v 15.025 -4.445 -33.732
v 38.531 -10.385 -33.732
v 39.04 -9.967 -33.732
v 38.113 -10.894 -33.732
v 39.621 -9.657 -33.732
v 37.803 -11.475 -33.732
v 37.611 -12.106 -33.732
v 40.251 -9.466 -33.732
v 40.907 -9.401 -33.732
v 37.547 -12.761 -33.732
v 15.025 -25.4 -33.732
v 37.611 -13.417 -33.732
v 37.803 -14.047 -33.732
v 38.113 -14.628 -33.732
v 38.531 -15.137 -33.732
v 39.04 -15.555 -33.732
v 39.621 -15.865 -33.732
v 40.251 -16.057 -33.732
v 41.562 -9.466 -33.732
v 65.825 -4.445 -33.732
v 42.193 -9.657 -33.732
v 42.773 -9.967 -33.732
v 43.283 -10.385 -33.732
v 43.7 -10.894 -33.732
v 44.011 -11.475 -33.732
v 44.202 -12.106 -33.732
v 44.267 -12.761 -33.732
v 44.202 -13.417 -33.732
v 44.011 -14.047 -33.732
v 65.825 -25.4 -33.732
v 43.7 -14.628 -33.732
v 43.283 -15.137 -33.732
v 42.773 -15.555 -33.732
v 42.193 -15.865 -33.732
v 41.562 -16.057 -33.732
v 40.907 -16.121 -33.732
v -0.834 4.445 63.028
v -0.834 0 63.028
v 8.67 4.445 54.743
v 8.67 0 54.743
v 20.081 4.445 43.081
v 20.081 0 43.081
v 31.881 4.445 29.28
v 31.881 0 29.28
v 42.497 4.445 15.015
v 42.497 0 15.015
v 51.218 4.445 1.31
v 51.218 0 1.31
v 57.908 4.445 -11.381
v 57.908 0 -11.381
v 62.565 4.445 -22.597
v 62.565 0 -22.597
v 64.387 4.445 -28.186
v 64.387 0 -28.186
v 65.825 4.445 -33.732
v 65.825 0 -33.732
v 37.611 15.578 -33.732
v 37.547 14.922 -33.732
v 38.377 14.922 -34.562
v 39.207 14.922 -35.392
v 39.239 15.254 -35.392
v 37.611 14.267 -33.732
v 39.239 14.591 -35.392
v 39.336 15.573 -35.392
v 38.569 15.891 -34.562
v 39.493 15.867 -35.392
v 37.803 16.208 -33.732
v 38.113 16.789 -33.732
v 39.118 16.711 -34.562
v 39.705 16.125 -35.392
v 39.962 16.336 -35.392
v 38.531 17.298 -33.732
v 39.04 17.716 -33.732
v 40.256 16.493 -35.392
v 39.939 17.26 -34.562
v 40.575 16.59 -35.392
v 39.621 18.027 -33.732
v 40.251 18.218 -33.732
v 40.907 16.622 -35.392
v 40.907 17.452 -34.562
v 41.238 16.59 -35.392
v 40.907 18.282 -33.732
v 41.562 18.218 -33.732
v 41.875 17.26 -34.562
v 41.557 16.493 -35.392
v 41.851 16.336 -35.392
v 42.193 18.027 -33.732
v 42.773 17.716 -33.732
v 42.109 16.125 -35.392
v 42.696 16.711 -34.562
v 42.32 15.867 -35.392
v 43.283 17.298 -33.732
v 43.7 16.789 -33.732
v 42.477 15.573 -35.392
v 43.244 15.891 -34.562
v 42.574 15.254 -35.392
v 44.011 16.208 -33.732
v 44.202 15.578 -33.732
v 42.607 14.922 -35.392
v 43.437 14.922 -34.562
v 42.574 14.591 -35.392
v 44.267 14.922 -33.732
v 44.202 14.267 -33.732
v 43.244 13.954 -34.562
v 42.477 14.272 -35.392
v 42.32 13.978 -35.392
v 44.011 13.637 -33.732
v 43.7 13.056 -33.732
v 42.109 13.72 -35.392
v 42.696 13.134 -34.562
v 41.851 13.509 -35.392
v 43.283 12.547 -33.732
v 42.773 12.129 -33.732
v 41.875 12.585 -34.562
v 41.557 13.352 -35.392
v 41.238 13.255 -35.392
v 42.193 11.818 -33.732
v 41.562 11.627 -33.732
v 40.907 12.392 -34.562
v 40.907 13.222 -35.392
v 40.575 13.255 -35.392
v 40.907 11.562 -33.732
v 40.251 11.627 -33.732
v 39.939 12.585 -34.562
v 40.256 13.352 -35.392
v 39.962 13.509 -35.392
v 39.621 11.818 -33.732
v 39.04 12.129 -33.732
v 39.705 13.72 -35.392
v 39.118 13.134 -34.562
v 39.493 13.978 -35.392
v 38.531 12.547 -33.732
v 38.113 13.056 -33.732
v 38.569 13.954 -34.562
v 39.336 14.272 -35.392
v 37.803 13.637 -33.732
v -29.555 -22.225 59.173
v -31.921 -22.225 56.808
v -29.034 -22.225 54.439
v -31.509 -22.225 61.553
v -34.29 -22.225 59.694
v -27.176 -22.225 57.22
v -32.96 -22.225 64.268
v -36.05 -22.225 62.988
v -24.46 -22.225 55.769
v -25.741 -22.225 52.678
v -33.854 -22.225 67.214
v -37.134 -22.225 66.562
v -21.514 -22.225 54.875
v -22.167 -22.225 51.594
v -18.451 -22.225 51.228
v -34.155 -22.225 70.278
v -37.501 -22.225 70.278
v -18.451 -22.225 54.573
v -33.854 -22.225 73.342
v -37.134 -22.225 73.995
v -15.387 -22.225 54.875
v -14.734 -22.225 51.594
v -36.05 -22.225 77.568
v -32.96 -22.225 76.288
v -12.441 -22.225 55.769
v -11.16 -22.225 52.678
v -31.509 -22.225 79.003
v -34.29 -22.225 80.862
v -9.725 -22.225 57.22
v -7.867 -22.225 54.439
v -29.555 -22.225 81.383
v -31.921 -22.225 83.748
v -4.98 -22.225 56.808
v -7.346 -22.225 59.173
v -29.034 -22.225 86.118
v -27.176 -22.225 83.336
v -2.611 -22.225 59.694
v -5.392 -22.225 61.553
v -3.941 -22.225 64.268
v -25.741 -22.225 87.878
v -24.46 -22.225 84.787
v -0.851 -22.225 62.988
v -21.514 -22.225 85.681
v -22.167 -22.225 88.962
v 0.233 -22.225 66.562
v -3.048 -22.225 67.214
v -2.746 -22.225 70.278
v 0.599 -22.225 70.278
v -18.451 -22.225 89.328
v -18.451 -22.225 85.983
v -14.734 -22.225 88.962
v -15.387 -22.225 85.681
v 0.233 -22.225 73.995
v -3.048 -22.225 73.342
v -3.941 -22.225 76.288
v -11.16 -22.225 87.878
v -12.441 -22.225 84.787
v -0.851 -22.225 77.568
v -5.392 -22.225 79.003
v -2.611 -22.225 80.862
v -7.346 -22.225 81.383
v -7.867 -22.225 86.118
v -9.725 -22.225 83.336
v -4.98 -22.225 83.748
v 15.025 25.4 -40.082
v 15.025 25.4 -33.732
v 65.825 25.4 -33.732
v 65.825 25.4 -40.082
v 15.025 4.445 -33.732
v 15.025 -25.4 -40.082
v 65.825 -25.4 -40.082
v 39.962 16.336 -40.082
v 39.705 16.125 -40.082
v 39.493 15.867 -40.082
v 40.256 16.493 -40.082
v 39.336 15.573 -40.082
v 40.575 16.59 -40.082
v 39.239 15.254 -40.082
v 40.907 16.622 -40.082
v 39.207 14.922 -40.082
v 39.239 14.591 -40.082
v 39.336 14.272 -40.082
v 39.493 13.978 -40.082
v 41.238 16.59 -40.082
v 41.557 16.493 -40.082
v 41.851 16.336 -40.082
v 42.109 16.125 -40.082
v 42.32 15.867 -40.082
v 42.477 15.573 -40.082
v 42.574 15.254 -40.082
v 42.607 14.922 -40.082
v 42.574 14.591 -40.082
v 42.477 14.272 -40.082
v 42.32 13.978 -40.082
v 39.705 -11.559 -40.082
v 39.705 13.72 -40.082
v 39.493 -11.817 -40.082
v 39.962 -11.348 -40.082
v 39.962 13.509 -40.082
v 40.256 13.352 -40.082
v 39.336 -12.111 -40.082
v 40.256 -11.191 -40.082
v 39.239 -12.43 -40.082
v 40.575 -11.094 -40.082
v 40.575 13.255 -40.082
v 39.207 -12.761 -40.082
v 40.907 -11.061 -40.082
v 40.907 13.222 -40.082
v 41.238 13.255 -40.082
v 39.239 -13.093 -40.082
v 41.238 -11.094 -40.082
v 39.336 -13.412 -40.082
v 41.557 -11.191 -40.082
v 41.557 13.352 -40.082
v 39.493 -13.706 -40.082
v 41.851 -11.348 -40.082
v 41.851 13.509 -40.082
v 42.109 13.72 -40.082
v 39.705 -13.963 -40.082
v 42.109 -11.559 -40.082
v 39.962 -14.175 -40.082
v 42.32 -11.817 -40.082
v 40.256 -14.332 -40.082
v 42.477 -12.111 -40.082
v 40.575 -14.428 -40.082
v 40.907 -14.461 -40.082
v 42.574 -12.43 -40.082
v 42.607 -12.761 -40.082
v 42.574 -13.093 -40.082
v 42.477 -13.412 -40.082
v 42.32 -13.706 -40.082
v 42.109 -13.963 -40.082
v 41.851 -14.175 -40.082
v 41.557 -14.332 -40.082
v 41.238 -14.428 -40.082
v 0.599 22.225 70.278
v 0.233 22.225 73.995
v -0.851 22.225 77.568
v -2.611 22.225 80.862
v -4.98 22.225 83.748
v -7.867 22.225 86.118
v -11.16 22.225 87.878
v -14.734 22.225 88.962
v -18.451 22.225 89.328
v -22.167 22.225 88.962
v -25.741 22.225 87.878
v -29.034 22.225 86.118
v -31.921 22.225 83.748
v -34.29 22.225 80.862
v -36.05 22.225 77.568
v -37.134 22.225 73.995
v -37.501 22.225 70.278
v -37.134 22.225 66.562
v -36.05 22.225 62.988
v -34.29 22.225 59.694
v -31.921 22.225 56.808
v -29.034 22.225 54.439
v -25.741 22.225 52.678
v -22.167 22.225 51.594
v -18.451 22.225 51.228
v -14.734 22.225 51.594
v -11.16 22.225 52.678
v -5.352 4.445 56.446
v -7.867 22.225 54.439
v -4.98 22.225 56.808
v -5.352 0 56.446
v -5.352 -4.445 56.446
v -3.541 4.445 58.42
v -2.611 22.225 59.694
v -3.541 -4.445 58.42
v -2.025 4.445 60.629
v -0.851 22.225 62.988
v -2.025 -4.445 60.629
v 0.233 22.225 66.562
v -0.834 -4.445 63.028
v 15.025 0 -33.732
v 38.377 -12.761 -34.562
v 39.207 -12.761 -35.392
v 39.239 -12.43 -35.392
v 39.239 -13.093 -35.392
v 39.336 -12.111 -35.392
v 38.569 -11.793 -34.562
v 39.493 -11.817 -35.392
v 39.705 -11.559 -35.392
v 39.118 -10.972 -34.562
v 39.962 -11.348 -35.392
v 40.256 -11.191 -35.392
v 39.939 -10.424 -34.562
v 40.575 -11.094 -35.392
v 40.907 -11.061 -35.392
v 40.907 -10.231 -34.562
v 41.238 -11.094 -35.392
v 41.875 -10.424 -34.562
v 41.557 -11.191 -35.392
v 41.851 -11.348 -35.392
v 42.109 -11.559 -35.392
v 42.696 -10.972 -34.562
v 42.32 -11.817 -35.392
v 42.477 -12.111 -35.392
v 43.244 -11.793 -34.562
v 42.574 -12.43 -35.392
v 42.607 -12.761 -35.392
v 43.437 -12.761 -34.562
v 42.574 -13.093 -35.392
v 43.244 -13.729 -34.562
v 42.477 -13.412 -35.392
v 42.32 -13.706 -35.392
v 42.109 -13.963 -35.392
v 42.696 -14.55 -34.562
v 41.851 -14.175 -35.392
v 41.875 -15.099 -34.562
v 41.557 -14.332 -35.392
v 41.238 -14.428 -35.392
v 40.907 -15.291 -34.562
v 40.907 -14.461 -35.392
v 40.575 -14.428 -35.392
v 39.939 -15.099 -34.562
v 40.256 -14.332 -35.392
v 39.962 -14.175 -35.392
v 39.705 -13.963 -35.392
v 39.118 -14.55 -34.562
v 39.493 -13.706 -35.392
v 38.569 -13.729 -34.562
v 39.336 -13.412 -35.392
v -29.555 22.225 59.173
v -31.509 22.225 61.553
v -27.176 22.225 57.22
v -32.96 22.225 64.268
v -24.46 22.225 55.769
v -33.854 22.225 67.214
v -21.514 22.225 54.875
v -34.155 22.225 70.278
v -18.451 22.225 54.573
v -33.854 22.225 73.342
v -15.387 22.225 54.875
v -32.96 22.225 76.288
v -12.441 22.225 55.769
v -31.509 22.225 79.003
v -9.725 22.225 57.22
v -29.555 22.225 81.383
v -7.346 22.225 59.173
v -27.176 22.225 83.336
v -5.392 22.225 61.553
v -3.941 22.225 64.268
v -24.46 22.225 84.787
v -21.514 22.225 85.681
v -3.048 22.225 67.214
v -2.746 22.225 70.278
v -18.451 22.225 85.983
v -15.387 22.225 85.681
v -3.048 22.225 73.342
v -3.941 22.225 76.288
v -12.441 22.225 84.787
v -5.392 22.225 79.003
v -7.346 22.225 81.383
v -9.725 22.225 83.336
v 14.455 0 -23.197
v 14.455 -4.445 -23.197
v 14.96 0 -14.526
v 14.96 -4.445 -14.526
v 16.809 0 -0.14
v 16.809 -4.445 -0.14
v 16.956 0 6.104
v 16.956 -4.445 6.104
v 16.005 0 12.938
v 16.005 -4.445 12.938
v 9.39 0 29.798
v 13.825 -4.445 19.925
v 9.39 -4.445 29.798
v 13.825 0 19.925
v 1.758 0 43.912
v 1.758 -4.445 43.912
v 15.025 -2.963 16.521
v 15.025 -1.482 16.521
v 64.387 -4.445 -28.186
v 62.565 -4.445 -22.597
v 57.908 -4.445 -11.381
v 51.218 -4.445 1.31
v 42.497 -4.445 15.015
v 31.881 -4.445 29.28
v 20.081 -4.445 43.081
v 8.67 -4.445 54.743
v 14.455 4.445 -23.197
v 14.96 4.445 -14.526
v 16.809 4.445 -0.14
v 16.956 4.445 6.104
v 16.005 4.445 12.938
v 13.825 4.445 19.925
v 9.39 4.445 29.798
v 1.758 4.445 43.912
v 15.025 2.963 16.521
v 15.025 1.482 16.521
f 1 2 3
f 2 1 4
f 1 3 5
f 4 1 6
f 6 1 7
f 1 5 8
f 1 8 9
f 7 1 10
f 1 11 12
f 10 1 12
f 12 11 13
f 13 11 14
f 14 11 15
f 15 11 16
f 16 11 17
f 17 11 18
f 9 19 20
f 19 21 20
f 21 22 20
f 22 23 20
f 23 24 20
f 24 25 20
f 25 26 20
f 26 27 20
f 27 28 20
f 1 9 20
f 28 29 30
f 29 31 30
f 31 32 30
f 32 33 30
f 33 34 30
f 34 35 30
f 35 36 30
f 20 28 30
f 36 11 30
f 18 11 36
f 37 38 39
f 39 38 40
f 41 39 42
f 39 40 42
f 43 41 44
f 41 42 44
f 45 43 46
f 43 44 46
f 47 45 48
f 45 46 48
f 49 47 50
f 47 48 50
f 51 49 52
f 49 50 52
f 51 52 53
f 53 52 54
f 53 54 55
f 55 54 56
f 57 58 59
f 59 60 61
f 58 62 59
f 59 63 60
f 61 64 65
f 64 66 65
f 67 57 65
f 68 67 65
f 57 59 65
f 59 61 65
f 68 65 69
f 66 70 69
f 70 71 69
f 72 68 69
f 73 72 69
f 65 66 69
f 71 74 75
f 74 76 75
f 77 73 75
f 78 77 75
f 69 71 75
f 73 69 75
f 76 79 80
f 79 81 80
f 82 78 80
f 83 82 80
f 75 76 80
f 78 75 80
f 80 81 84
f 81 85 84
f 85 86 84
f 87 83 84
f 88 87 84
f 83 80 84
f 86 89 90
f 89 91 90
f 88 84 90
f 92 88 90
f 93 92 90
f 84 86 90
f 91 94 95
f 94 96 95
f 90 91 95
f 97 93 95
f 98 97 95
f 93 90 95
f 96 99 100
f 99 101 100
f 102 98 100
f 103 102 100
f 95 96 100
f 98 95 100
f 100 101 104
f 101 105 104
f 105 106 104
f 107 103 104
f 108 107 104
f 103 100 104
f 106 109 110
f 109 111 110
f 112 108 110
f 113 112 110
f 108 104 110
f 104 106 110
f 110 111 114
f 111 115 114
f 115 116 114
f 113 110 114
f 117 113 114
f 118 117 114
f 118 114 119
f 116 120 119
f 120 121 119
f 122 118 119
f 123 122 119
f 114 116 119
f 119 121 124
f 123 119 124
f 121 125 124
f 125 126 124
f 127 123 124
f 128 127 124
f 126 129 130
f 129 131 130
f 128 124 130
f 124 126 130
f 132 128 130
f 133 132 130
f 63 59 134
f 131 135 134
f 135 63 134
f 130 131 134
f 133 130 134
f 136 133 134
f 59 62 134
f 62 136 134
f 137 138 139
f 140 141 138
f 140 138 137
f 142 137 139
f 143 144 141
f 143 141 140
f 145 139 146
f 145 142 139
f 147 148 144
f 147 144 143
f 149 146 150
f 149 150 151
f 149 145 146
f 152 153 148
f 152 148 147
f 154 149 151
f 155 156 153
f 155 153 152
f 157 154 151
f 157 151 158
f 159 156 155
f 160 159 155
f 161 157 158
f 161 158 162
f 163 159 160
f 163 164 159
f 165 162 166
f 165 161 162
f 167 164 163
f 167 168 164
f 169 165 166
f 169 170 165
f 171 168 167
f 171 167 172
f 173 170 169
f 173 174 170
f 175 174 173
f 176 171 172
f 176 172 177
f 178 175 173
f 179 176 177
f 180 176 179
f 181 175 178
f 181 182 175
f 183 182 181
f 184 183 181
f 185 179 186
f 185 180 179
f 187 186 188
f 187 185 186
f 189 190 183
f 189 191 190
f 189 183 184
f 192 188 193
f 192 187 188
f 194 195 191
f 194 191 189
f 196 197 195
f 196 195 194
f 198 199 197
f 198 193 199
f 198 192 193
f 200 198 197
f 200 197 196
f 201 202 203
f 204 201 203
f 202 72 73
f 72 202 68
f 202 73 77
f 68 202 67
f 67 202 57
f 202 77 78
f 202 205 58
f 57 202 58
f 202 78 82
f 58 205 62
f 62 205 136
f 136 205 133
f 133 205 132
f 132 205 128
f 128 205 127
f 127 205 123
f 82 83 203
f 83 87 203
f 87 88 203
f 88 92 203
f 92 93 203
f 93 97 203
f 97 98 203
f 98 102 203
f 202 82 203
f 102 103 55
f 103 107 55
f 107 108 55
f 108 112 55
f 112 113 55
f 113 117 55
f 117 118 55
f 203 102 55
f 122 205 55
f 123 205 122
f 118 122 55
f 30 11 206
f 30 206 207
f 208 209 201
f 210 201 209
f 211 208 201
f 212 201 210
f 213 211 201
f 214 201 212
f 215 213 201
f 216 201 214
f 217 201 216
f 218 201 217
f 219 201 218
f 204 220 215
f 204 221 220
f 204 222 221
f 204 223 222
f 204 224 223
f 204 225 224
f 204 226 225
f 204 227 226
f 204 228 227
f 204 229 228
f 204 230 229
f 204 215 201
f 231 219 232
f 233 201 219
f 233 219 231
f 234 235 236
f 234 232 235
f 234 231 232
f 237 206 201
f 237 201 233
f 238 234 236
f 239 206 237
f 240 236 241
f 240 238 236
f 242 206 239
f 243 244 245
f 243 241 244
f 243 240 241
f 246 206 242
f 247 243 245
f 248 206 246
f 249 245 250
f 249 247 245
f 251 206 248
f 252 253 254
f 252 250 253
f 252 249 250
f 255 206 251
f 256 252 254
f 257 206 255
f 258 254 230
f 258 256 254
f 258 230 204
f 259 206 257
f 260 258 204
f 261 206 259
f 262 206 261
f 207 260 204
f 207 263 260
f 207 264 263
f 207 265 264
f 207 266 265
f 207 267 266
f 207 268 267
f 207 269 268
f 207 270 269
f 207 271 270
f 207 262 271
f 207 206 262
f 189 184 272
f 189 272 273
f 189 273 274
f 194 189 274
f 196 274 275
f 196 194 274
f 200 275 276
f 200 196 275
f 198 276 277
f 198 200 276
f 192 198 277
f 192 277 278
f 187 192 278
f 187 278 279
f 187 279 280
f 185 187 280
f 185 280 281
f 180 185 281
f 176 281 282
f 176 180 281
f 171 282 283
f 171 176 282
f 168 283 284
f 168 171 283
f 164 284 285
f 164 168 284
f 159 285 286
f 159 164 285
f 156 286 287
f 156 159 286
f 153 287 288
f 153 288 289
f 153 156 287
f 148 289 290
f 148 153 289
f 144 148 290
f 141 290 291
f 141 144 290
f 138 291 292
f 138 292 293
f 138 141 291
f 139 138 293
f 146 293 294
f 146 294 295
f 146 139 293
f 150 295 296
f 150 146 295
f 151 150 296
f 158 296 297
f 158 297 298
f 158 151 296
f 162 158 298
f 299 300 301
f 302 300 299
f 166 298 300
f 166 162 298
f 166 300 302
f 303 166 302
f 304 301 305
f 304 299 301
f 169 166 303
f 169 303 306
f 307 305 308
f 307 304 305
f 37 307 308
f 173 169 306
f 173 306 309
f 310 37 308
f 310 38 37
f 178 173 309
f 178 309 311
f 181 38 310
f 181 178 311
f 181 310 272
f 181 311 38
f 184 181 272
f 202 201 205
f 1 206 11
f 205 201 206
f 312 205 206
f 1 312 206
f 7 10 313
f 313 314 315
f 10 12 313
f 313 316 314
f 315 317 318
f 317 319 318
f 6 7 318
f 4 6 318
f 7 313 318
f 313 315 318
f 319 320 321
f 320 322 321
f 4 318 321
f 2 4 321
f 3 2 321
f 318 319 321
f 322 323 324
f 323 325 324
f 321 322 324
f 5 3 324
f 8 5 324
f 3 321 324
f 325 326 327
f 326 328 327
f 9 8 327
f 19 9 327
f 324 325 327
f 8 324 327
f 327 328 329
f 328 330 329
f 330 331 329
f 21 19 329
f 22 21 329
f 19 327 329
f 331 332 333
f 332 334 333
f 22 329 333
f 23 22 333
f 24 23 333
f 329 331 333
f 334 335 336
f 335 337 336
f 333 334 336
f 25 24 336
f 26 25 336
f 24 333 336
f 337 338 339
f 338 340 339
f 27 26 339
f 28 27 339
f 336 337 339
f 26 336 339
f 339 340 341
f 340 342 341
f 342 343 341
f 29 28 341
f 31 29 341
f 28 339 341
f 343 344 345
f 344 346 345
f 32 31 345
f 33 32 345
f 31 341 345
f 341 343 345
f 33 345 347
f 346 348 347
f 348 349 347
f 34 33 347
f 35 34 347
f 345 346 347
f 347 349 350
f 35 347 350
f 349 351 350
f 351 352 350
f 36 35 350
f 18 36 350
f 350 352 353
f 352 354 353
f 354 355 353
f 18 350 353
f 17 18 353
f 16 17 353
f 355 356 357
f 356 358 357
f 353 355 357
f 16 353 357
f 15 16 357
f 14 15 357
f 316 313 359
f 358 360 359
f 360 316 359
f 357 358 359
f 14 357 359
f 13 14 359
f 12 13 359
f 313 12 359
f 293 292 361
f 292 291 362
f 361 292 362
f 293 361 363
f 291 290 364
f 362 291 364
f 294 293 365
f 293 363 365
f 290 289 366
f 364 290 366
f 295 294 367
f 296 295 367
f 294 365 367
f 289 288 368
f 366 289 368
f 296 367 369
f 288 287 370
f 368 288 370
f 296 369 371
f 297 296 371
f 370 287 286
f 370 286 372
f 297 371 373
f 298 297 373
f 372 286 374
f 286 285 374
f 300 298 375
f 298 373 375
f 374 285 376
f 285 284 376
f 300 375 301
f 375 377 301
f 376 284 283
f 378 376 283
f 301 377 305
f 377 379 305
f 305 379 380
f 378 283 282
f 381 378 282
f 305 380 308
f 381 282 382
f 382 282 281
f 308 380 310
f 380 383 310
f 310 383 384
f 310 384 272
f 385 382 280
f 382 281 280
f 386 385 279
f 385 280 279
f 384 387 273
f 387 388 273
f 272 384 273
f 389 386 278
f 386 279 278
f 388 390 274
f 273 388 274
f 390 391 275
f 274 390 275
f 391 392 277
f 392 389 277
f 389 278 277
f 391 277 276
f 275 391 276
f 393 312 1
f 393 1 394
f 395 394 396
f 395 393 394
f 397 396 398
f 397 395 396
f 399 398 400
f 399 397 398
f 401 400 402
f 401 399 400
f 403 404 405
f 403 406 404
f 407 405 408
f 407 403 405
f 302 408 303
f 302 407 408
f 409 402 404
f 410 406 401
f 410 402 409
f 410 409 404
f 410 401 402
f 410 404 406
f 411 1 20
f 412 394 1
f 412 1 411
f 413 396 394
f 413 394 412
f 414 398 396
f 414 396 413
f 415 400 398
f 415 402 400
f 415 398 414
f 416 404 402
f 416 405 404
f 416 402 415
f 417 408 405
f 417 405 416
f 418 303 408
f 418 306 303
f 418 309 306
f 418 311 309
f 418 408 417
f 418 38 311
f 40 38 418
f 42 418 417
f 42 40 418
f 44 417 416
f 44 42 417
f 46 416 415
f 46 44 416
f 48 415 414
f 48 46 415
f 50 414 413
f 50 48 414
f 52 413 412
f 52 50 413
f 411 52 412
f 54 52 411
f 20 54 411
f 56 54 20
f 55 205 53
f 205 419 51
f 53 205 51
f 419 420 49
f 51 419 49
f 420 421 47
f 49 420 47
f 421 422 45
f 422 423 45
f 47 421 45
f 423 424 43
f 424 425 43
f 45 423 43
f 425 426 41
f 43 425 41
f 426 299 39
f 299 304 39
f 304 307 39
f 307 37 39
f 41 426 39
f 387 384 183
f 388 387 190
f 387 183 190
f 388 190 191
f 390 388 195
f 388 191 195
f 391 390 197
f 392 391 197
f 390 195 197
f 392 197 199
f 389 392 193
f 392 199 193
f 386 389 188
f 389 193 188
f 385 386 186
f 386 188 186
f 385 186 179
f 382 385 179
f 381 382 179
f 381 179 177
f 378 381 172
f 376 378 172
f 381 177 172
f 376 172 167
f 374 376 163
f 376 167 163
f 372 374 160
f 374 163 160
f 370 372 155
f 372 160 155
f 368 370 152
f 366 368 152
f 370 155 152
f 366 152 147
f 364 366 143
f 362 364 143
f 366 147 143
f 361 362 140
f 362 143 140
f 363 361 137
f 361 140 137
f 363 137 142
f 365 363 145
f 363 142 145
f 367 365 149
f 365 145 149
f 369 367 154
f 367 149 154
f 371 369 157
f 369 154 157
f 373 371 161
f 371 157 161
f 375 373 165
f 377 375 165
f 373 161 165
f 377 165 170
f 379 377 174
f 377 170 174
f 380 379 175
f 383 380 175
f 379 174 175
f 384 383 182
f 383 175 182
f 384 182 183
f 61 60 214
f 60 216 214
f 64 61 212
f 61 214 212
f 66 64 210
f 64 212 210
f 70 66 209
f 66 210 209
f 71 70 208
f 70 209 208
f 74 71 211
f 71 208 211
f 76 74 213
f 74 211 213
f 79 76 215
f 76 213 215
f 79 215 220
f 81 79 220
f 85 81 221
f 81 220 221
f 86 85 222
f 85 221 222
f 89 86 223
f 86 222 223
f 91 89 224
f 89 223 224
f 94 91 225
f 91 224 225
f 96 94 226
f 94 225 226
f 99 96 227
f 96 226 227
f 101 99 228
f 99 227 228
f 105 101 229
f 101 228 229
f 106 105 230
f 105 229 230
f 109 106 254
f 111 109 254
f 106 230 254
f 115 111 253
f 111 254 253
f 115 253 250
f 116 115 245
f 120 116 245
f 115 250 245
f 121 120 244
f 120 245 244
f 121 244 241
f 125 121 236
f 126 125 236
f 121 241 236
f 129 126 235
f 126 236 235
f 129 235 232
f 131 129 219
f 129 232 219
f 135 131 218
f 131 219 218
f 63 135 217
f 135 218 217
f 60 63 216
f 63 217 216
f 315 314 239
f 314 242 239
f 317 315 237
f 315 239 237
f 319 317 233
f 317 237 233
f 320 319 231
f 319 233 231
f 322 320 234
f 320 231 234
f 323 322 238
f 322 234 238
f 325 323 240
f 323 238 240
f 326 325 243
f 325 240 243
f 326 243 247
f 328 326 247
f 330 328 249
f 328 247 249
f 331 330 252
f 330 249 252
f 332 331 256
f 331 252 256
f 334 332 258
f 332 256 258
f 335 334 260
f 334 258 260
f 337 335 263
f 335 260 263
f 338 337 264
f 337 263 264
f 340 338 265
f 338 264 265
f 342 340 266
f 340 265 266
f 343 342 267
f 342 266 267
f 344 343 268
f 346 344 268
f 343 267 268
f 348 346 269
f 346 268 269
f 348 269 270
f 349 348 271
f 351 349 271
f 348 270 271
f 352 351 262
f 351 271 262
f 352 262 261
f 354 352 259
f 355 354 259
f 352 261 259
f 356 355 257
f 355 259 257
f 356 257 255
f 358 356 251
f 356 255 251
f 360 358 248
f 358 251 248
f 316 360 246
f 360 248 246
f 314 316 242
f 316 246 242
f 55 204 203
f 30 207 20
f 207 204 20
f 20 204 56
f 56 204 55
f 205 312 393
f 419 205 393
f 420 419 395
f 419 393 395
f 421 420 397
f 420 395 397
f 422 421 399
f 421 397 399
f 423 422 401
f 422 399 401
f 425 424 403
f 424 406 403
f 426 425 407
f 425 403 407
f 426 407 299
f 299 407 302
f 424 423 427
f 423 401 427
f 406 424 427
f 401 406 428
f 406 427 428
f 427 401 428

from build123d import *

# Parameters (mm, degrees)
F0_W           = 50.8
F0_H           = 6.35
F1_DEPTH       = 25.4
F2_DEPTH       = 4.445
F3_R           = 19.05
F4_DEPTH       = 22.225
F5_R           = 15.7047598919
F6_DEPTH       = 44.45
F8_D           = 3.4
F8_CSINK_D     = 6.72
F8_CSINK_ANGLE = 90
F9_D           = 3.4
F9_CSINK_D     = 6.72
F9_CSINK_ANGLE = 90


with BuildPart() as f1:
    # F0 (on Front) → F1 (new body, symmetric)
    with BuildSketch(Plane.XZ):
        with Locations((40.4247476995, -36.9068052319)):
            Rectangle(F0_W, F0_H)
    extrude(amount=F1_DEPTH, both=True)

    # F0 (on Front) → F2 (join, symmetric)
    with BuildSketch(Plane.XZ):
        with Locations((40.4247476995, -36.9068052319)):
            Rectangle(F0_W, F0_H)
        with BuildLine():
            Line((15.0247476995, -33.7318052319), (65.8247476995, -33.7318052319))
            add(Edge.make_bspline(
                [(15.0247476995, -33.7318052319), (12.2795119362, -9.1876940642), (29.4644343196, 7.3717802798), (-44.7611190361, 108.9306998857), (54.9041464645, 15.0382978493), (65.8247476995, -33.7318052319)],
                knots=[0, 0, 0, 0, 0.2744626476, 0.5653253519, 1, 1, 1, 1], degree=3))
        make_face()
    extrude(amount=F2_DEPTH, both=True)

    # F3 (on Front) → F4 (join, symmetric)
    with BuildSketch(Plane.XZ):
        with Locations((-18.4505134821, 70.2780410647)):
            Circle(F3_R)
    extrude(amount=F4_DEPTH, both=True)

    # F5 (on face) → F6 (cut)
    with BuildSketch(Plane.XZ.offset(22.225)):
        with Locations((-18.4505134821, 70.2780410647)):
            Circle(F5_R)
    extrude(amount=-F6_DEPTH, mode=Mode.SUBTRACT)

    # F8 (through all)
    with Locations(Plane.XY.offset(-33.7318052319)):
        with Locations((40.906753391, 14.9225)):
            CounterSinkHole(F8_D / 2, F8_CSINK_D / 2, counter_sink_angle=F8_CSINK_ANGLE)

    # F9 (through all)
    with Locations(Plane.XY.offset(-33.7318052319)):
        with Locations((40.906753391, -12.7611579373)):
            CounterSinkHole(F9_D / 2, F9_CSINK_D / 2, counter_sink_angle=F9_CSINK_ANGLE)


solid = f1.part
